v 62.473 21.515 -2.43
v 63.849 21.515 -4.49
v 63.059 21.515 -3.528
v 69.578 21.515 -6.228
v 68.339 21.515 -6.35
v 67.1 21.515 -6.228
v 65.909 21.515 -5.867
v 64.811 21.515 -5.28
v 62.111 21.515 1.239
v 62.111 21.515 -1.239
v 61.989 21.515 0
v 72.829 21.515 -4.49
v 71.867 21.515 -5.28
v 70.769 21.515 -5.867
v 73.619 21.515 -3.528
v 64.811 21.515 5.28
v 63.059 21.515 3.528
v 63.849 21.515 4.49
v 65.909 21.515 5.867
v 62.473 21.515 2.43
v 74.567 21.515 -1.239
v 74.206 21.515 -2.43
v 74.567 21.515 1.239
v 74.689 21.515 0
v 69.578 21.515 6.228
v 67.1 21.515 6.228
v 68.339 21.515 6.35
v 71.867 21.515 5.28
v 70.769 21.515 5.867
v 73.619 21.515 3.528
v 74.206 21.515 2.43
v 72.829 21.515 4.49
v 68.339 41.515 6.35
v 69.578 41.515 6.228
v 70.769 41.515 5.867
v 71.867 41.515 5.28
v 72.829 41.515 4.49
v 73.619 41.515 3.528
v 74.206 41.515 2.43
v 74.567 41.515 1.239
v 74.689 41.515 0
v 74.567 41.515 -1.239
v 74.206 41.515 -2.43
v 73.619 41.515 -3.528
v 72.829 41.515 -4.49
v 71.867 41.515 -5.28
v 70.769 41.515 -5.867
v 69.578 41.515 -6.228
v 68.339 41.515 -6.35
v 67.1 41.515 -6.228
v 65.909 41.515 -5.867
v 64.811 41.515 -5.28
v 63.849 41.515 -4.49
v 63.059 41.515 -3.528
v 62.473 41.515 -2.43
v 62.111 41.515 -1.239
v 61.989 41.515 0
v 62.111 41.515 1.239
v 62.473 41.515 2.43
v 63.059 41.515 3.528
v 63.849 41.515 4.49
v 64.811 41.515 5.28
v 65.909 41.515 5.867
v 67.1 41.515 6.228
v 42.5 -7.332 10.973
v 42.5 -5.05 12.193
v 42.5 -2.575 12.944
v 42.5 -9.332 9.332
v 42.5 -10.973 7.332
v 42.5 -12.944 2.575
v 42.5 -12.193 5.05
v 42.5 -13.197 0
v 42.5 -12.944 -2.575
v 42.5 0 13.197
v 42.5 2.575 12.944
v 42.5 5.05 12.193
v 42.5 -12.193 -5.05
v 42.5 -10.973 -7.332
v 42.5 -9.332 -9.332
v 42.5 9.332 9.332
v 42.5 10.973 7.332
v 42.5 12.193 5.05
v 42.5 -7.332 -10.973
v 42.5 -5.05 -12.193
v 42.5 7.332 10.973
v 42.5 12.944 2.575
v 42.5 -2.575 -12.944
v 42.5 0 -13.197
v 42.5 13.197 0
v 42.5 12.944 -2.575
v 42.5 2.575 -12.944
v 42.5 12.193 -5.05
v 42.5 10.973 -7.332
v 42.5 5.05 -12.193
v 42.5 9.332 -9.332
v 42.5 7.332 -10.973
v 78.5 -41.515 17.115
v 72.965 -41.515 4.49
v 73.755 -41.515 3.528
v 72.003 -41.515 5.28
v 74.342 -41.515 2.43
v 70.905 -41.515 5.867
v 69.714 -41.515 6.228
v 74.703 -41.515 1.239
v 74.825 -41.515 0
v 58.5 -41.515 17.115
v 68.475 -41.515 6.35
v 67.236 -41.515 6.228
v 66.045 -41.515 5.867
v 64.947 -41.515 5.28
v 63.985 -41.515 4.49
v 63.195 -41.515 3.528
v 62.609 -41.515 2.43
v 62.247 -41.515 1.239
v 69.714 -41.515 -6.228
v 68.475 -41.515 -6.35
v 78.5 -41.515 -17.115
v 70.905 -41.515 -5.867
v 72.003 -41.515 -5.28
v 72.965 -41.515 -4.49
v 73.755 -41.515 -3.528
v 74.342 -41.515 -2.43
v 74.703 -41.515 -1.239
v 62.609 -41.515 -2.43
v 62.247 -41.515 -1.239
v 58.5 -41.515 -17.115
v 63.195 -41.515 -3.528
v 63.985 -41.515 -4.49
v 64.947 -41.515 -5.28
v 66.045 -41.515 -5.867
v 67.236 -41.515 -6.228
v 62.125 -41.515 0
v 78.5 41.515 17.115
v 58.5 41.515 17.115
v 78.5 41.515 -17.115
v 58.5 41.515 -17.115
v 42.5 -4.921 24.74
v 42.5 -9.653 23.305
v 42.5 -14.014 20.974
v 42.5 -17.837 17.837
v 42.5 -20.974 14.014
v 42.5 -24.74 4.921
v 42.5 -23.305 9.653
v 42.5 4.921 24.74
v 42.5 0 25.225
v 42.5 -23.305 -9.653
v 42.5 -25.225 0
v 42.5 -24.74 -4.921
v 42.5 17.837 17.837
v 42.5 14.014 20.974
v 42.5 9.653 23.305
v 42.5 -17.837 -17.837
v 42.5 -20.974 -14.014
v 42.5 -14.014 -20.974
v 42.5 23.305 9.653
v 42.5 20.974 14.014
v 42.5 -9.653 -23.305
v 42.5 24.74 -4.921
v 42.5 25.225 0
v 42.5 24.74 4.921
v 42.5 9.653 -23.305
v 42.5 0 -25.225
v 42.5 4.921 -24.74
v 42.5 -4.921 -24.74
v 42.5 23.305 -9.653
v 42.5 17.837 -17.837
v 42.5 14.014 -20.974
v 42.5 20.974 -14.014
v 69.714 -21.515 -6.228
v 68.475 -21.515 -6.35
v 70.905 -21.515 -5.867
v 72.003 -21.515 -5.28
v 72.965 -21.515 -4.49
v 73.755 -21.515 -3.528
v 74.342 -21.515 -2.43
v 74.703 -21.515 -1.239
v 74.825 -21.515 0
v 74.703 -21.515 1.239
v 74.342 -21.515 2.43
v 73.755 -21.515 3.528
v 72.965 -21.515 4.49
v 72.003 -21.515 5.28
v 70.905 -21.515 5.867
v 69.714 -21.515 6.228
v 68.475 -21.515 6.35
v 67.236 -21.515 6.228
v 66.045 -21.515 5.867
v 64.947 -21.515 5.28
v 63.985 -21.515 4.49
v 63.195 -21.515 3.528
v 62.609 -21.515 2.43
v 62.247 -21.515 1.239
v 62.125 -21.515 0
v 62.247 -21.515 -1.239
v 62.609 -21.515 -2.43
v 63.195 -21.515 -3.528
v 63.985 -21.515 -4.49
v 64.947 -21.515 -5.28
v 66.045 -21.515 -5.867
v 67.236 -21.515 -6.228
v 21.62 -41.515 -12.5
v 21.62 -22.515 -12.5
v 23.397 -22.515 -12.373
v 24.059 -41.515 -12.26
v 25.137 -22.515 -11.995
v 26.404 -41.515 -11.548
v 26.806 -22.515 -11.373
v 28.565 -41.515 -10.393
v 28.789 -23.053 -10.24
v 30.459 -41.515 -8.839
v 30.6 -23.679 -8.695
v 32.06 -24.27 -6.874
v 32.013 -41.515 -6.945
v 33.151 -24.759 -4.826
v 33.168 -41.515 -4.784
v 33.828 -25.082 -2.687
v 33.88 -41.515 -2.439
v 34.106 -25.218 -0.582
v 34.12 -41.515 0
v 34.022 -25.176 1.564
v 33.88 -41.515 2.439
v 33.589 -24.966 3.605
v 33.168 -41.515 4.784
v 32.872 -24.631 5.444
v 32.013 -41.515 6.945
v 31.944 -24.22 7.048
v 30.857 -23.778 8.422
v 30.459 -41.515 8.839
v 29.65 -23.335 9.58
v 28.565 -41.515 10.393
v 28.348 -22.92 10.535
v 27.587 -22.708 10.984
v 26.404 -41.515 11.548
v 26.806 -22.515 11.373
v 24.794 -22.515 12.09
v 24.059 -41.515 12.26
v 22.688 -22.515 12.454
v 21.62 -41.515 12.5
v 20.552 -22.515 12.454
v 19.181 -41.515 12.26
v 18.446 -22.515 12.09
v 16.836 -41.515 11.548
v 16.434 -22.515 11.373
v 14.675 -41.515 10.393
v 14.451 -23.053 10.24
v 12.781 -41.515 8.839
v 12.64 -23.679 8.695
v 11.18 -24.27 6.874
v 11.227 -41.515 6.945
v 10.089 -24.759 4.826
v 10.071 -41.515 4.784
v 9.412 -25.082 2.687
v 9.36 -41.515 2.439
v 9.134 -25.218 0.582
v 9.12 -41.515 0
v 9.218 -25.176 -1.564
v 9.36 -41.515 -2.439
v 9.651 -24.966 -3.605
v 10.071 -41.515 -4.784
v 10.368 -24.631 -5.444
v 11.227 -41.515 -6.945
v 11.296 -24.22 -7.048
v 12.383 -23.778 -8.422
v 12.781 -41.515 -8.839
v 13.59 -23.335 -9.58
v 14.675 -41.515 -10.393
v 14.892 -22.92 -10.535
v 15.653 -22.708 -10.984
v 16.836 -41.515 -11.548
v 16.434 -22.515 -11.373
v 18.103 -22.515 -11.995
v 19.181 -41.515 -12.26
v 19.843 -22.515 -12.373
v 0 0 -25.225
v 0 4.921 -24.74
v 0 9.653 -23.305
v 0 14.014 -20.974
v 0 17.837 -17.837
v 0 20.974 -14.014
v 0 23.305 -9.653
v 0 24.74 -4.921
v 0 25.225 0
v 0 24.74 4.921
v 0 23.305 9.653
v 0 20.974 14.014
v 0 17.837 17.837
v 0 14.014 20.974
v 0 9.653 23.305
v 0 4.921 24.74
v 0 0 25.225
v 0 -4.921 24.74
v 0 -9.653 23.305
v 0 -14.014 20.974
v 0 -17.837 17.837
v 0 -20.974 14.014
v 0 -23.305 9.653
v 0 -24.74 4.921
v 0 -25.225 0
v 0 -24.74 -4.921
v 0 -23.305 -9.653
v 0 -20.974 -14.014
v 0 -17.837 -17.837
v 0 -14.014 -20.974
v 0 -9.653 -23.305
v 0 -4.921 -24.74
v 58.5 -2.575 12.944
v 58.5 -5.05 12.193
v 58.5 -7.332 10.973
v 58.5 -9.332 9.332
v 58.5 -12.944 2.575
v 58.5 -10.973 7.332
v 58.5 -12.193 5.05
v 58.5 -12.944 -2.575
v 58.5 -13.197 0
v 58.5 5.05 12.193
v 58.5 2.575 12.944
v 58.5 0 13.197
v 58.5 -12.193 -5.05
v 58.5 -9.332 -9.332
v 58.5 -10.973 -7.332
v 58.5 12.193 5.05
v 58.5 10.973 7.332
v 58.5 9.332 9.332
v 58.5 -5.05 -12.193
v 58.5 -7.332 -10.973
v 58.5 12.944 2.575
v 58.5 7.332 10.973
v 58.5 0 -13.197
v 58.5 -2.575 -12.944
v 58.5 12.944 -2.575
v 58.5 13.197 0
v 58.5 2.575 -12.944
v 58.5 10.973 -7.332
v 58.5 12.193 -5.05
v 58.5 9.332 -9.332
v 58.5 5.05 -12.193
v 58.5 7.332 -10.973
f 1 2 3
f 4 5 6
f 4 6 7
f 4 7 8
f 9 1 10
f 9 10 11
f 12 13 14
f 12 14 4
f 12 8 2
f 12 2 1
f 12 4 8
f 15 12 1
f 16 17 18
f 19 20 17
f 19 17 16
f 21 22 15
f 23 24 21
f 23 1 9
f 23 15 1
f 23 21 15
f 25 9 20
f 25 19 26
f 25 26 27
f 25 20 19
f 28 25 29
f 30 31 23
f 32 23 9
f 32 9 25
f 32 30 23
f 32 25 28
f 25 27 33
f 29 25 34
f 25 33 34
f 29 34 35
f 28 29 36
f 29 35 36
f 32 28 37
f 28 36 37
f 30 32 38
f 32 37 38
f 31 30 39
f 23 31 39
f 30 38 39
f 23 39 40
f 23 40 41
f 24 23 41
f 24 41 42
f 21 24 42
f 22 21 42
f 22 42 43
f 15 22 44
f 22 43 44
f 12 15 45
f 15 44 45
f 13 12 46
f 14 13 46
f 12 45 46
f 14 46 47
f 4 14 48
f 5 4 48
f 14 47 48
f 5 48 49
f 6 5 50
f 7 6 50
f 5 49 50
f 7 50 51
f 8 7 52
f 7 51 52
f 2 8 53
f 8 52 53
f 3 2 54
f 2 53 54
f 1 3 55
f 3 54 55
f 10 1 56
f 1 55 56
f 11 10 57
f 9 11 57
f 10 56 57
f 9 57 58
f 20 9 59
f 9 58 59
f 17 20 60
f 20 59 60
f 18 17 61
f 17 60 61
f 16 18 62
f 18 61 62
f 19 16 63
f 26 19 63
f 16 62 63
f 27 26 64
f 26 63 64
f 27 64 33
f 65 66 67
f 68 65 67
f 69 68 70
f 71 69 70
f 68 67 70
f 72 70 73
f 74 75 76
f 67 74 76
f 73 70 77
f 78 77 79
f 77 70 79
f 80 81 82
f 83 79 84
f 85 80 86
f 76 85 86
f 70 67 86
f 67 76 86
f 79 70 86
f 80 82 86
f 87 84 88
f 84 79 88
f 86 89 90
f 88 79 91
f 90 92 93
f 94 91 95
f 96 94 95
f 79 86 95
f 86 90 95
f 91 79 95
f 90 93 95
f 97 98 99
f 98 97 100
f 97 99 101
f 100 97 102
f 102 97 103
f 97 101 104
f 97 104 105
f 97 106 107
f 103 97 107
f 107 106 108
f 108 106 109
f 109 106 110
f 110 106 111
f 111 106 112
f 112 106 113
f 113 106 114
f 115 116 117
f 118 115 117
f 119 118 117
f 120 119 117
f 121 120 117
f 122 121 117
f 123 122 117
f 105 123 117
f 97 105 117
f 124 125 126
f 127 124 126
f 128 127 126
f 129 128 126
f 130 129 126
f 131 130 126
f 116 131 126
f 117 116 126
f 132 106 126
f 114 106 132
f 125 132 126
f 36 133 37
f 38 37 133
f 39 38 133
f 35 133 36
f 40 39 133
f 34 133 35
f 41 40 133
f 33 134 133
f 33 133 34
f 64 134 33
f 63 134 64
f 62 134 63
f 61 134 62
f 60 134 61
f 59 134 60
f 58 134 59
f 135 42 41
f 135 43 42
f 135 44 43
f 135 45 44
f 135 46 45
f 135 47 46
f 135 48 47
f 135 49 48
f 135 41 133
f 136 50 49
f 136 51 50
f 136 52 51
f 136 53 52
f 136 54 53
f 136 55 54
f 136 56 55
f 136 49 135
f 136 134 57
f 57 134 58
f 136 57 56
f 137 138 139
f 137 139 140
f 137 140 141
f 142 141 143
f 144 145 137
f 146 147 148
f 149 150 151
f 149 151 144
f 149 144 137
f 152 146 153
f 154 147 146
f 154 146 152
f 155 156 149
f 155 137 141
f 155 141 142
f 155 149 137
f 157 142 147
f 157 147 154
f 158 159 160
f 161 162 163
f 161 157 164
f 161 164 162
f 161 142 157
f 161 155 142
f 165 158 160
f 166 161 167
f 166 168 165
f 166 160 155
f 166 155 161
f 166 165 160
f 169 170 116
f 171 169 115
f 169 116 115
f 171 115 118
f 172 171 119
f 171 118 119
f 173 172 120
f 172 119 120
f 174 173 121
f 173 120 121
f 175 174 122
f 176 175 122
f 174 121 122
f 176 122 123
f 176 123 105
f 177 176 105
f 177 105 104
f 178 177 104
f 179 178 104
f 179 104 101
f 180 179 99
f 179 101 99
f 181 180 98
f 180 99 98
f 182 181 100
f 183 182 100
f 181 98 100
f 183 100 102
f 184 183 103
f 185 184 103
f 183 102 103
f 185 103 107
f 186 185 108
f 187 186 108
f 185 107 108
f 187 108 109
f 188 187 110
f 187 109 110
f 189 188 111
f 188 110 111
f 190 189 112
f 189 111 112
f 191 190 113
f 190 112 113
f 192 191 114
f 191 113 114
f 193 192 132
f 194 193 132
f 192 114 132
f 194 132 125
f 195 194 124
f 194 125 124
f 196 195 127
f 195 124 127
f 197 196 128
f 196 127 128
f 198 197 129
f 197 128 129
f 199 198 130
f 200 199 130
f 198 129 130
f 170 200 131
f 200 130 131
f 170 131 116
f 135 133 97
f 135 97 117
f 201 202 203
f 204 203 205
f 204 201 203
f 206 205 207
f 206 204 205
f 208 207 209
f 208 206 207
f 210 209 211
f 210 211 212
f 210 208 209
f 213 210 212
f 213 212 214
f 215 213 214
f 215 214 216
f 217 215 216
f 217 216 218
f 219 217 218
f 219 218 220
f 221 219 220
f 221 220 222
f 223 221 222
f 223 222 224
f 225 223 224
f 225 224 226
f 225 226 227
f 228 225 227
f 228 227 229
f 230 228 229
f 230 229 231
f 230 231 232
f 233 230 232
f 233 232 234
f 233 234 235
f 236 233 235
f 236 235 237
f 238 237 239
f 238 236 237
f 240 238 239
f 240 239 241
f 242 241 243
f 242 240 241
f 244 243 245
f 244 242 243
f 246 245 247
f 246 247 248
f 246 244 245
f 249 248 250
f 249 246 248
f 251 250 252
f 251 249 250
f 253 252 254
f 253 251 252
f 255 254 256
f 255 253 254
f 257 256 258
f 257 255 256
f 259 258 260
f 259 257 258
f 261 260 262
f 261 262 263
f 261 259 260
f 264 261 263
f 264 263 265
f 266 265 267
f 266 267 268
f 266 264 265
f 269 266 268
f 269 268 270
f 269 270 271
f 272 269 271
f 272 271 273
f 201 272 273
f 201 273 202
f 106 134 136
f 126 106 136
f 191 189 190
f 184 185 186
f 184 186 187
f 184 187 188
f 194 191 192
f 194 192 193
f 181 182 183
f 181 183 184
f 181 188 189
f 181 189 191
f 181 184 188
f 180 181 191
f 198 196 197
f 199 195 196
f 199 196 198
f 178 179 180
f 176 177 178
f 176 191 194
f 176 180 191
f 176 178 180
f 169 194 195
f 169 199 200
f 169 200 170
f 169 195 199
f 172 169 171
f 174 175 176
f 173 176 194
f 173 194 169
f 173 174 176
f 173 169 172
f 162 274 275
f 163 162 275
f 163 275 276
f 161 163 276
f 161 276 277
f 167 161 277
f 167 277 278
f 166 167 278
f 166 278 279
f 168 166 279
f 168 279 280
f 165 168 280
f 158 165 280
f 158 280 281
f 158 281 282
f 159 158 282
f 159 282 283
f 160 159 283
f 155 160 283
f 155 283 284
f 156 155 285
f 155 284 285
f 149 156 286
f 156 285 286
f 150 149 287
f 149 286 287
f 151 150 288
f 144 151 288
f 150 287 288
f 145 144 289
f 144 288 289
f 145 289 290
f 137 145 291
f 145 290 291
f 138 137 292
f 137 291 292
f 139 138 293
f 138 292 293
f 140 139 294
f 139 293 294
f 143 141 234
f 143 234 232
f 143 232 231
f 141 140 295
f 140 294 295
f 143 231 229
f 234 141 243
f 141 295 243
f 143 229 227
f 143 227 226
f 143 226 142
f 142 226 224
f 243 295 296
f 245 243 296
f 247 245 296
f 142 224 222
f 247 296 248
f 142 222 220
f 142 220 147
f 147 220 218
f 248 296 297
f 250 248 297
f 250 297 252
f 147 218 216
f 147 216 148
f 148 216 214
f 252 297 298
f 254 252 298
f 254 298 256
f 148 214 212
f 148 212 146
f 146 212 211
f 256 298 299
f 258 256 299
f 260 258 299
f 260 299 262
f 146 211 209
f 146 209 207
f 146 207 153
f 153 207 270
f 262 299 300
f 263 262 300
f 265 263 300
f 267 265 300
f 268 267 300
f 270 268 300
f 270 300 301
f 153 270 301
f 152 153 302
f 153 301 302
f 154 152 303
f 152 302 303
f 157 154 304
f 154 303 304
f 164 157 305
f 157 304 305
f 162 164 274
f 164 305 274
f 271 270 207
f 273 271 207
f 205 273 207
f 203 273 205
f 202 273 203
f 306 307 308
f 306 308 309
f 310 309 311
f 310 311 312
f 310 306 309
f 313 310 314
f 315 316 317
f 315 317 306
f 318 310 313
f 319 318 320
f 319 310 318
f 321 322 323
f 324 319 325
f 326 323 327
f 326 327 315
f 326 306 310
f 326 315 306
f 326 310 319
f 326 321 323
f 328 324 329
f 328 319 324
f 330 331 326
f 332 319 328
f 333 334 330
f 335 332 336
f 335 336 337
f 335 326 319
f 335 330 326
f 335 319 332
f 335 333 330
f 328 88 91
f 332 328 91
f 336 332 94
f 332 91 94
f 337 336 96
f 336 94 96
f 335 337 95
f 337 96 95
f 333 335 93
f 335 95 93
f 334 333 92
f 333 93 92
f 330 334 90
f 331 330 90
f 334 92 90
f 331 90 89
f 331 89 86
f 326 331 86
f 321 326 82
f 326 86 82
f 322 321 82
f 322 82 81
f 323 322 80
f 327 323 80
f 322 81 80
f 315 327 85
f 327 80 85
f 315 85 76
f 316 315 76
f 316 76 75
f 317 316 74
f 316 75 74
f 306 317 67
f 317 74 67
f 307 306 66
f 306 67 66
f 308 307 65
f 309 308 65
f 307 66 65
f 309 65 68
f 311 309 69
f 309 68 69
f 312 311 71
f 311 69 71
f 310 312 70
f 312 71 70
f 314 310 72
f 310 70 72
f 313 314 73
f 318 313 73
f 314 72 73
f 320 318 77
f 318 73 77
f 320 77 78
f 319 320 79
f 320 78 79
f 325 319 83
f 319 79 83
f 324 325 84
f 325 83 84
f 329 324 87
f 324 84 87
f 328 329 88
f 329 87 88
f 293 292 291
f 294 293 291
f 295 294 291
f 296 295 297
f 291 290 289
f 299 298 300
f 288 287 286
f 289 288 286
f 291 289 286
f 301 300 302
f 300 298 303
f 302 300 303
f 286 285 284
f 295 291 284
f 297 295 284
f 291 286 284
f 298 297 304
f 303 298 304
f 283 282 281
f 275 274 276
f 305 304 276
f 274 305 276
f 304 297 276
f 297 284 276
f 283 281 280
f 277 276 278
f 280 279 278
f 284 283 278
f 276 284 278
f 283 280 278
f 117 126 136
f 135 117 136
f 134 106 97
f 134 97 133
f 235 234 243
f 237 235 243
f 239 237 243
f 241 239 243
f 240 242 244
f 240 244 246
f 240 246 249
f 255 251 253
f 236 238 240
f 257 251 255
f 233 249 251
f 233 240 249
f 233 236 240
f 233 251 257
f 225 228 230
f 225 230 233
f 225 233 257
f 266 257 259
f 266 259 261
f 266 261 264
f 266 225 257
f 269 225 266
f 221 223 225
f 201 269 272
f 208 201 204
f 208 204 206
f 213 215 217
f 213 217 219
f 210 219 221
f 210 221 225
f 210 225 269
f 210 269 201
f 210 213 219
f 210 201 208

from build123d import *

# Parameters (mm, degrees)
SKETCH2_R           = 25.225
BOSS_EXTRUDE1_DEPTH = 42.5
SKETCH3_R           = 13.197131212
BOSS_EXTRUDE2_DEPTH = 16
SKETCH4_W           = 34.230022124
SKETCH4_H           = 83.030932044
BOSS_EXTRUDE3_DEPTH = 20
SKETCH6_R           = 6.35
CUT_EXTRUDE1_DEPTH  = 20
SKETCH7_R           = 6.35
CUT_EXTRUDE2_DEPTH  = 20
SKETCH8_R           = 12.5
BOSS_EXTRUDE4_DEPTH = 19


with BuildPart() as part:
    # Sketch2 → Boss-Extrude1 (new body)
    with BuildSketch(Plane(origin=(0, 0, 0), x_dir=(0, 0, -1), z_dir=(1, 0, 0))):
        Circle(SKETCH2_R)
    extrude(amount=BOSS_EXTRUDE1_DEPTH)

    # Sketch8 → Boss-Extrude4 (add)
    with BuildSketch(Plane.XZ.offset(41.515466022)):
        with Locations(Location((21.61998888, 0, 0), (0, 0, 270))):
            Circle(SKETCH8_R)
    extrude(amount=-BOSS_EXTRUDE4_DEPTH)


with BuildPart() as body_2:
    # Sketch3 → Boss-Extrude2 (new body)
    with BuildSketch(Plane(origin=(42.5, 0, 0), x_dir=(0, 0, -1), z_dir=(1, 0, 0))):
        Circle(SKETCH3_R)
    extrude(amount=BOSS_EXTRUDE2_DEPTH)


with BuildPart() as body_3:
    # Sketch4 → Boss-Extrude3 (new body)
    with BuildSketch(Plane(origin=(58.5, 0, 0), x_dir=(0, 0, -1), z_dir=(1, 0, 0))):
        Rectangle(SKETCH4_W, SKETCH4_H)
    extrude(amount=BOSS_EXTRUDE3_DEPTH)

    # Sketch6 → Cut-Extrude1 (cut)
    with BuildSketch(Plane(origin=(0, 41.515466022, 0), x_dir=(1, 0, 0), z_dir=(0, 1, 0))):
        with Locations(Location((68.339291029, 0, 0), (0, 0, 270))):
            Circle(SKETCH6_R)
    extrude(amount=-CUT_EXTRUDE1_DEPTH, mode=Mode.SUBTRACT)

    # Sketch7 → Cut-Extrude2 (cut)
    with BuildSketch(Plane.XZ.offset(41.515466022)):
        with Locations(Location((68.475312175, 0, 0), (0, 0, 270))):
            Circle(SKETCH7_R)
    extrude(amount=-CUT_EXTRUDE2_DEPTH, mode=Mode.SUBTRACT)


solid = Compound([part.part, body_2.part, body_3.part])
